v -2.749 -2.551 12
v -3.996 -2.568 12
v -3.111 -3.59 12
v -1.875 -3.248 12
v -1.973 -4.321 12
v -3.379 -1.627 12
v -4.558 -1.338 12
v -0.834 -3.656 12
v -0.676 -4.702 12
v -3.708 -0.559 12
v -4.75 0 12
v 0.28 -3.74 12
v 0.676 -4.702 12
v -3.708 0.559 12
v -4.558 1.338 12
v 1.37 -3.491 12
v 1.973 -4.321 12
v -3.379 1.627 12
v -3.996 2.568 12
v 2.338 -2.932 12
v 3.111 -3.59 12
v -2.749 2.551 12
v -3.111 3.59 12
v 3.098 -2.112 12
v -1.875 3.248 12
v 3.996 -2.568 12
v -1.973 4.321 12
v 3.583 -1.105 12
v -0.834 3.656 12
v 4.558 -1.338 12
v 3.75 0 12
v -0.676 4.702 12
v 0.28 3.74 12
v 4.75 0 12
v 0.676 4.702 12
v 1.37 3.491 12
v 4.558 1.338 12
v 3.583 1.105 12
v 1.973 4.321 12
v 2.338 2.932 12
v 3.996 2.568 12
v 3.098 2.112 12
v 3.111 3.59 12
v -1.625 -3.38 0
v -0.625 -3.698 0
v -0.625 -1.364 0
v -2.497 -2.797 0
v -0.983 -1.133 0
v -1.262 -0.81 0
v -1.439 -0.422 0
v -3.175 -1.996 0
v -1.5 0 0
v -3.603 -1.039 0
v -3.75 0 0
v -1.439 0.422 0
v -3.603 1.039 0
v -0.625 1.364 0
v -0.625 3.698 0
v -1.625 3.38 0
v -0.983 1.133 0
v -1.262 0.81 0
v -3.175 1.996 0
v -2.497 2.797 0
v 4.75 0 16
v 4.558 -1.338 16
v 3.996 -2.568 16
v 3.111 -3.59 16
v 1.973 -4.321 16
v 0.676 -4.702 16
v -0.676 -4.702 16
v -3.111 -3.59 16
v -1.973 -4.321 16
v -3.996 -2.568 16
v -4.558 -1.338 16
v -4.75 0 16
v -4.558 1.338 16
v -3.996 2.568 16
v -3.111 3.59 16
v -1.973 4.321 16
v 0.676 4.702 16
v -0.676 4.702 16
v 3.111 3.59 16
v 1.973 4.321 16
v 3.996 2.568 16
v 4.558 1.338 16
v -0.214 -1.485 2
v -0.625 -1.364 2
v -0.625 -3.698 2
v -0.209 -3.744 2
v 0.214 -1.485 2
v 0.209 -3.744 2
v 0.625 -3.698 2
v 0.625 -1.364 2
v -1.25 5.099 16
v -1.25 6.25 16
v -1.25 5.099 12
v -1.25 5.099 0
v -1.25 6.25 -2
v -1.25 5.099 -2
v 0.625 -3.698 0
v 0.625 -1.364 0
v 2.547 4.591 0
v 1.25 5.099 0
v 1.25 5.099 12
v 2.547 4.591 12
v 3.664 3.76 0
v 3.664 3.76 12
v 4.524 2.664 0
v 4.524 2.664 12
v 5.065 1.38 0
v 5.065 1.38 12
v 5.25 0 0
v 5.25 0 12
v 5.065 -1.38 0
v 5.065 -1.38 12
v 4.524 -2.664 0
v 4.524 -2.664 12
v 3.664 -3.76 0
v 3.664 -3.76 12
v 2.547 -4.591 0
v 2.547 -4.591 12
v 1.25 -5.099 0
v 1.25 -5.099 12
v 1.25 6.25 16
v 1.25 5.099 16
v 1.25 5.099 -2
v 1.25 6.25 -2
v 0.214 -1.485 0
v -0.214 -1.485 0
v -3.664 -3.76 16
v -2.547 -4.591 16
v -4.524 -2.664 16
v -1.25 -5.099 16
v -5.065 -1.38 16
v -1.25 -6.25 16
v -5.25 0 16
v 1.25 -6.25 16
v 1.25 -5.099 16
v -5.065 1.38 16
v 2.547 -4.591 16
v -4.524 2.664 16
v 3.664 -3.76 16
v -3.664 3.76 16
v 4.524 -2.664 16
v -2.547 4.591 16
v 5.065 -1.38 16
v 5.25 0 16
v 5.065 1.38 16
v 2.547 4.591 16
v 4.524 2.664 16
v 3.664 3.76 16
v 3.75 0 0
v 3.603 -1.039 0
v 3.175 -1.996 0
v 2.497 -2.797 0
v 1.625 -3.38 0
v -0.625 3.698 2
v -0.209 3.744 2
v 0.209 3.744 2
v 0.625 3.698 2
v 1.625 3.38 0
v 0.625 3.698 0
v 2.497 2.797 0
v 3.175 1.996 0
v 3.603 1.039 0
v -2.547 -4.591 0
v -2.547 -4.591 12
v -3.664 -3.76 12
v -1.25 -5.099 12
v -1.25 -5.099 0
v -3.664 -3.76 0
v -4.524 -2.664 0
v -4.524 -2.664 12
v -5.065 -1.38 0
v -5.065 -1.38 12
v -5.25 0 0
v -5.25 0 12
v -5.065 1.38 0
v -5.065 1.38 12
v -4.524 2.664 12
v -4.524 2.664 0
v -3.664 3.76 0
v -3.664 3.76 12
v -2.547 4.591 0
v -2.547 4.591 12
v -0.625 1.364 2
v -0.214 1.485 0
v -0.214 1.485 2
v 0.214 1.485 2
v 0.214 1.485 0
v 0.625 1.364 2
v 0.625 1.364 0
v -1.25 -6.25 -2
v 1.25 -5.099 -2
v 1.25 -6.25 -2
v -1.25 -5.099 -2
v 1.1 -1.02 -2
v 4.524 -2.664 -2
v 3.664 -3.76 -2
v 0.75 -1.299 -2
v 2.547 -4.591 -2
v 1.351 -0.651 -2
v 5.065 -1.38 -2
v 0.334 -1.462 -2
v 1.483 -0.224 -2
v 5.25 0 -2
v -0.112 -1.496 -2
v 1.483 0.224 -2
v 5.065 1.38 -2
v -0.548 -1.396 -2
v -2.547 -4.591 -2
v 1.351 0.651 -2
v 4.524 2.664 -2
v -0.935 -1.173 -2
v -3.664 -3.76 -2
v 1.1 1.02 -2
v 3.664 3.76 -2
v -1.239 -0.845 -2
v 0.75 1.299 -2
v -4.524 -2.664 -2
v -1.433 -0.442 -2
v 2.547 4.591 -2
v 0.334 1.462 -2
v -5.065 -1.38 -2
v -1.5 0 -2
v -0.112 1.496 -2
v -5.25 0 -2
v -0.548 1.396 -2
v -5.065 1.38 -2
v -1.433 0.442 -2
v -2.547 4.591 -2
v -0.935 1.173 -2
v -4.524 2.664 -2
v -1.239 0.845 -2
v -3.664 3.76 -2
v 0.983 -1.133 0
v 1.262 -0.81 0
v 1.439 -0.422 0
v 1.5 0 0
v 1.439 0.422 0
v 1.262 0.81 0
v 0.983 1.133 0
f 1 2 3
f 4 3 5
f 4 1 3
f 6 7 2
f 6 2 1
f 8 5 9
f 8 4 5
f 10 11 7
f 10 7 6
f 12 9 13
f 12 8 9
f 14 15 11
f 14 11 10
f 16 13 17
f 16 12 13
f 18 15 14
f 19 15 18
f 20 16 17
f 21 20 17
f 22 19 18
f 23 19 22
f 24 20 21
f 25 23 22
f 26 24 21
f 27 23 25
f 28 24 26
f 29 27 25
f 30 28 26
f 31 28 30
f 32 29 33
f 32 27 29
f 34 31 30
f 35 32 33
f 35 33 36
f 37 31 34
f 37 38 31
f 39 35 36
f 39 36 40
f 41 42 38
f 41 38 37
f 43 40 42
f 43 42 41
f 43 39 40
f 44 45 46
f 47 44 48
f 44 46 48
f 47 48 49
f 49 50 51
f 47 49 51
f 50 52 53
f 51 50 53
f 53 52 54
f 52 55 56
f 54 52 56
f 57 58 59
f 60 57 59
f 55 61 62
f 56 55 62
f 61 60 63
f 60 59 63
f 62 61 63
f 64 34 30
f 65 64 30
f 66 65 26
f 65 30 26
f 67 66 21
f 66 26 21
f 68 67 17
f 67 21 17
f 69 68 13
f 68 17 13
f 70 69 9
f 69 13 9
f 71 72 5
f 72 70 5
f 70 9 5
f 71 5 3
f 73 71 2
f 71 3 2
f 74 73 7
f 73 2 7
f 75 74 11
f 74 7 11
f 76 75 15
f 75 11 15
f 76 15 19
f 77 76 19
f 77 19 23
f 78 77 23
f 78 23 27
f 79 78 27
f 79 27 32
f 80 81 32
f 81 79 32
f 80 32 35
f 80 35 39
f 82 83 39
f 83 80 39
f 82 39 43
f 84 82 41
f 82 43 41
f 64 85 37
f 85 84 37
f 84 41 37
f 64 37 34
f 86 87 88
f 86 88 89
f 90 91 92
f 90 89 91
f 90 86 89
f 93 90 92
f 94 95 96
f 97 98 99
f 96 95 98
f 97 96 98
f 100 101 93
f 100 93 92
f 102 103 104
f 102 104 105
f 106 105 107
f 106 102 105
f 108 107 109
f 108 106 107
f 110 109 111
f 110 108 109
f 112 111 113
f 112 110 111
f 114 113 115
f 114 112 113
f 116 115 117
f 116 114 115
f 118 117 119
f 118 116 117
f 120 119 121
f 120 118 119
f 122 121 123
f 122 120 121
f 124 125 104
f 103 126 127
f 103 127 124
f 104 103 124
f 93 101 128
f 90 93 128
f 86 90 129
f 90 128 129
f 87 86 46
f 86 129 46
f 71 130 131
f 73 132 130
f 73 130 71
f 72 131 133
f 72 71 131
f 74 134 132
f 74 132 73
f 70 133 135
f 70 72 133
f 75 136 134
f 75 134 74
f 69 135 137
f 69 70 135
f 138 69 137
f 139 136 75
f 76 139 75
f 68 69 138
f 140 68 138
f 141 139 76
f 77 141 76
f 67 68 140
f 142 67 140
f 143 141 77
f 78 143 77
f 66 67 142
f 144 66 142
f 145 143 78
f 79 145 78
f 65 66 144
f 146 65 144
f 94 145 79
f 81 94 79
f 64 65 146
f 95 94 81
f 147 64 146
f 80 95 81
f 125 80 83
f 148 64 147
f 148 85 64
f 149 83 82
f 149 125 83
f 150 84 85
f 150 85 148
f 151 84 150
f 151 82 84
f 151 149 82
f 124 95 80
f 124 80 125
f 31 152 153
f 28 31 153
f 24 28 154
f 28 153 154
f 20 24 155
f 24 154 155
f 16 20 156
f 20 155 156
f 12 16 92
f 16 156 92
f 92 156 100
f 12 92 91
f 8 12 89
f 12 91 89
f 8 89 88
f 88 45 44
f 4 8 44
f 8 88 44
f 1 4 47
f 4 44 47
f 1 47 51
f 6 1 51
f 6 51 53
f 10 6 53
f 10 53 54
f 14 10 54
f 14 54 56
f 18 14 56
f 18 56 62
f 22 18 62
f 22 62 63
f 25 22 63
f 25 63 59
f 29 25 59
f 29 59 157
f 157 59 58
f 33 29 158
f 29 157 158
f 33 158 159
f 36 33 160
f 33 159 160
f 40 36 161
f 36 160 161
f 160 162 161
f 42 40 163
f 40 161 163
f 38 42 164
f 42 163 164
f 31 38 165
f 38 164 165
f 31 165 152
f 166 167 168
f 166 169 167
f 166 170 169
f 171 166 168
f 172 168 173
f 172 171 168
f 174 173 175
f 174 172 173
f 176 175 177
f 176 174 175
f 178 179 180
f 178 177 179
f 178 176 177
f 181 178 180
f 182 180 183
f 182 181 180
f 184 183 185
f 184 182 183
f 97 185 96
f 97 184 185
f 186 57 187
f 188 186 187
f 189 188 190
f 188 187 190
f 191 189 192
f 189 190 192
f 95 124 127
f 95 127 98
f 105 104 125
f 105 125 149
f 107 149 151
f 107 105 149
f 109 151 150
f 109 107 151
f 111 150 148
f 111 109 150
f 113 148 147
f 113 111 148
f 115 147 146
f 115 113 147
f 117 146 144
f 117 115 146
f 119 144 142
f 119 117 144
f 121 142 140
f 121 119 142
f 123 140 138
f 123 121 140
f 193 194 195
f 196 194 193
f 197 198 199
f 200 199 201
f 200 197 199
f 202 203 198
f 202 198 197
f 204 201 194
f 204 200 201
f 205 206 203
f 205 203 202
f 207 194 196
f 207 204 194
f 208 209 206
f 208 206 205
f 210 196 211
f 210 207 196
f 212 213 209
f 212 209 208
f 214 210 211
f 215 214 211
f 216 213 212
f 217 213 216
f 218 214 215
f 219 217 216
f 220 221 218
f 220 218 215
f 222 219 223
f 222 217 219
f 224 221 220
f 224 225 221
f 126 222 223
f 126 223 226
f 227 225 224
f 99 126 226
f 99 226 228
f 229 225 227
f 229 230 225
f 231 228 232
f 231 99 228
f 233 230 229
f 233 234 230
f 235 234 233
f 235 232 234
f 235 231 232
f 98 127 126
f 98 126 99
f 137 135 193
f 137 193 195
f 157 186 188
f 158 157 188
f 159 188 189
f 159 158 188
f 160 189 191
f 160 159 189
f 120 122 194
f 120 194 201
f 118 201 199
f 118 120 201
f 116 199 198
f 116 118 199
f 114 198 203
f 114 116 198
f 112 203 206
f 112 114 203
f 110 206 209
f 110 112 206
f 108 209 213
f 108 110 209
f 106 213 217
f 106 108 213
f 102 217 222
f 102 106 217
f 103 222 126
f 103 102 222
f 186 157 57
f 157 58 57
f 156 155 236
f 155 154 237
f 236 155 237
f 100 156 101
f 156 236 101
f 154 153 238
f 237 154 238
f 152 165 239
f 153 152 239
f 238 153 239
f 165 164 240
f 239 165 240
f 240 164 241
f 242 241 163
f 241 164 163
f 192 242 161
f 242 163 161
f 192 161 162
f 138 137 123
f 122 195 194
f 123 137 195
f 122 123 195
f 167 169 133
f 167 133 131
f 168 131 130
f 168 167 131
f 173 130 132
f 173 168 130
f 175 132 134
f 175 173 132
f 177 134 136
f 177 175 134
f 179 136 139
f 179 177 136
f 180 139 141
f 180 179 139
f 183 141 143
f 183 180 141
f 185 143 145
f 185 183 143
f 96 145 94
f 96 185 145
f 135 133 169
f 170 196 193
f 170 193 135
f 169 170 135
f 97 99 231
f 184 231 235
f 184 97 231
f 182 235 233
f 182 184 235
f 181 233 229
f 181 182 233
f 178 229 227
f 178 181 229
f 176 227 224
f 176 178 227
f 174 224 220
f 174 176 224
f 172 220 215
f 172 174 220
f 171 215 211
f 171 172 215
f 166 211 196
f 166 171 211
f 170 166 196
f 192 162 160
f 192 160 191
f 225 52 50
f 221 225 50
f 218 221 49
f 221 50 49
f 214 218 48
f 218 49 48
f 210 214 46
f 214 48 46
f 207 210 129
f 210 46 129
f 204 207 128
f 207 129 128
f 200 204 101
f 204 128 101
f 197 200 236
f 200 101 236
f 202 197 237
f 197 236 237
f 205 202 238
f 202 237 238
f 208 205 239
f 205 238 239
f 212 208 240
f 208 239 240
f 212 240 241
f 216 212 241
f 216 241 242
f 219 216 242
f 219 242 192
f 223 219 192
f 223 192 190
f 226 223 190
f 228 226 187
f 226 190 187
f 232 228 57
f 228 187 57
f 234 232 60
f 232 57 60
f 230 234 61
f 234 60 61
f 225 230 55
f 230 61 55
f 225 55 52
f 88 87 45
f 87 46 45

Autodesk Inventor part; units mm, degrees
ref_plane "YZ Plane" through (0, 0, 0) normal (1, 0, 0) x (0, 1, 0)
ref_plane "XZ Plane" through (0, 0, 0) normal (0, 1, 0) x (-1, 0, 0)
ref_plane "XY Plane" through (0, 0, 0) normal (0, 0, 1) x (1, 0, 0)
sketch "Sketch1" plane through (0, 0, 0) normal (0, 0, 1) x (1, 0, 0)
  circle A0 centre (0, 0) radius 3.75
  line L0 (1.25, -6.25) -> (-1.25, -6.25)
  line L1 (-1.25, -6.25) -> (-1.25, 6.25) construction
  line L2 (-1.25, 6.25) -> (1.25, 6.25)
  line L3 (1.25, 6.25) -> (1.25, -6.25) construction
  circle A1 centre (0, 0) radius 5.25
  line L4 (1.25, -5.099) -> (1.25, -6.25)
  line L5 (-1.25, -6.25) -> (-1.25, -5.099)
  line L6 (-1.25, 6.25) -> (-1.25, 5.099)
  line L7 (1.25, 6.25) -> (1.25, 5.099)
  arc A2 (-1.25, -5.099) -> (1.25, -5.099) centre (0, 0) ccw
  arc A3 (1.25, 5.099) -> (-1.25, 5.099) centre (0, 0) ccw
  point P0 (0, 6.25)
  point P1 (1.25, 0)
  dimension "d1" = 7.5
  dimension "d10" = 2.5
  dimension "d11" = 12.5
  dimension "d12" = 10.5
extrude "Extrusion1" add sketch "Sketch1" along normal blind 12
sketch "Sketch5" plane through (0, 0, 0) normal (0, 0, -1) x (-1, 0, 0)
  circle A0 centre (0, 0) radius 3.75 projected
  circle A1 centre (0, 0) radius 3.75 projected
  line L0 (-1.25, -6.25) -> (-1.25, -5.099) projected
  line L1 (1.25, -6.25) -> (-1.25, -6.25) projected
  line L2 (1.25, -5.099) -> (1.25, -6.25) projected
  arc A2 (1.25, -5.099) -> (1.25, 5.099) centre (0, 0) ccw projected
  line L3 (1.25, 6.25) -> (1.25, 5.099) projected
  line L4 (-1.25, 6.25) -> (1.25, 6.25) projected
  line L5 (-1.25, 5.099) -> (-1.25, 6.25) projected
  arc A3 (-1.25, 5.099) -> (-1.25, -5.099) centre (0, 0) ccw projected
  circle A4 centre (0, 0) radius 1.5
  dimension "d13" = 3
extrude "Extrusion4" add sketch "Sketch5" along normal blind 2 contours A0 | L0 A3 L5 L4 L3 A2 L2 L1
sketch "Sketch6" plane through (0, 0, 0) normal (0, 0, 1) x (1, 0, 0)
  line L0 (0.625, 6.25) -> (-0.625, 6.25)
  line L1 (-0.625, 6.25) -> (-0.625, -6.25) construction
  line L2 (-0.625, -6.25) -> (0.625, -6.25)
  line L3 (0.625, -6.25) -> (0.625, 6.25) construction
  line L4 (-1.25, 6.25) -> (1.25, 6.25) projected
  circle A0 centre (0, 0) radius 1.5 construction
  arc A1 (0.625, 1.3636) -> (-0.625, 1.3636) centre (0, 0) ccw
  arc A2 (-0.625, -1.3636) -> (0.625, -1.3636) centre (0, 0) ccw
  line L5 (0.625, 6.25) -> (0.625, 1.3636)
  line L6 (-0.625, 6.25) -> (-0.625, 1.3636)
  line L7 (0.625, -1.3636) -> (0.625, -6.25)
  line L8 (-0.625, -1.3636) -> (-0.625, -6.25)
  point P0 (0, 0)
  point P1 (0, 6.25)
  point P2 (0.625, 0)
  dimension "d16" = 1.25
extrude "Extrusion5" add sketch "Sketch6" along normal blind 2
sketch "Sketch9" plane through (0, 0, 12) normal (0, 0, 1) x (1, 0, 0)
  circle A0 centre (0, 0) radius 3.75 construction
  line L0 (1.25, -6.25) -> (1.25, -5.099) projected
  arc A1 (1.25, -5.099) -> (1.25, 5.099) centre (0, 0) ccw projected
  line L1 (1.25, 5.099) -> (1.25, 6.25) projected
  line L2 (1.25, 6.25) -> (-1.25, 6.25) projected
  line L3 (-1.25, 6.25) -> (-1.25, 5.099) projected
  arc A2 (-1.25, 5.099) -> (-1.25, -5.099) centre (0, 0) ccw projected
  line L4 (-1.25, -5.099) -> (-1.25, -6.25) projected
  line L5 (-1.25, -6.25) -> (1.25, -6.25) projected
  circle A3 centre (0, 0) radius 4.75
  dimension "d23" = 9.5
extrude "Extrusion7" add sketch "Sketch9" along normal blind 4
properties part number "AA042" material "ABS Plastic"
